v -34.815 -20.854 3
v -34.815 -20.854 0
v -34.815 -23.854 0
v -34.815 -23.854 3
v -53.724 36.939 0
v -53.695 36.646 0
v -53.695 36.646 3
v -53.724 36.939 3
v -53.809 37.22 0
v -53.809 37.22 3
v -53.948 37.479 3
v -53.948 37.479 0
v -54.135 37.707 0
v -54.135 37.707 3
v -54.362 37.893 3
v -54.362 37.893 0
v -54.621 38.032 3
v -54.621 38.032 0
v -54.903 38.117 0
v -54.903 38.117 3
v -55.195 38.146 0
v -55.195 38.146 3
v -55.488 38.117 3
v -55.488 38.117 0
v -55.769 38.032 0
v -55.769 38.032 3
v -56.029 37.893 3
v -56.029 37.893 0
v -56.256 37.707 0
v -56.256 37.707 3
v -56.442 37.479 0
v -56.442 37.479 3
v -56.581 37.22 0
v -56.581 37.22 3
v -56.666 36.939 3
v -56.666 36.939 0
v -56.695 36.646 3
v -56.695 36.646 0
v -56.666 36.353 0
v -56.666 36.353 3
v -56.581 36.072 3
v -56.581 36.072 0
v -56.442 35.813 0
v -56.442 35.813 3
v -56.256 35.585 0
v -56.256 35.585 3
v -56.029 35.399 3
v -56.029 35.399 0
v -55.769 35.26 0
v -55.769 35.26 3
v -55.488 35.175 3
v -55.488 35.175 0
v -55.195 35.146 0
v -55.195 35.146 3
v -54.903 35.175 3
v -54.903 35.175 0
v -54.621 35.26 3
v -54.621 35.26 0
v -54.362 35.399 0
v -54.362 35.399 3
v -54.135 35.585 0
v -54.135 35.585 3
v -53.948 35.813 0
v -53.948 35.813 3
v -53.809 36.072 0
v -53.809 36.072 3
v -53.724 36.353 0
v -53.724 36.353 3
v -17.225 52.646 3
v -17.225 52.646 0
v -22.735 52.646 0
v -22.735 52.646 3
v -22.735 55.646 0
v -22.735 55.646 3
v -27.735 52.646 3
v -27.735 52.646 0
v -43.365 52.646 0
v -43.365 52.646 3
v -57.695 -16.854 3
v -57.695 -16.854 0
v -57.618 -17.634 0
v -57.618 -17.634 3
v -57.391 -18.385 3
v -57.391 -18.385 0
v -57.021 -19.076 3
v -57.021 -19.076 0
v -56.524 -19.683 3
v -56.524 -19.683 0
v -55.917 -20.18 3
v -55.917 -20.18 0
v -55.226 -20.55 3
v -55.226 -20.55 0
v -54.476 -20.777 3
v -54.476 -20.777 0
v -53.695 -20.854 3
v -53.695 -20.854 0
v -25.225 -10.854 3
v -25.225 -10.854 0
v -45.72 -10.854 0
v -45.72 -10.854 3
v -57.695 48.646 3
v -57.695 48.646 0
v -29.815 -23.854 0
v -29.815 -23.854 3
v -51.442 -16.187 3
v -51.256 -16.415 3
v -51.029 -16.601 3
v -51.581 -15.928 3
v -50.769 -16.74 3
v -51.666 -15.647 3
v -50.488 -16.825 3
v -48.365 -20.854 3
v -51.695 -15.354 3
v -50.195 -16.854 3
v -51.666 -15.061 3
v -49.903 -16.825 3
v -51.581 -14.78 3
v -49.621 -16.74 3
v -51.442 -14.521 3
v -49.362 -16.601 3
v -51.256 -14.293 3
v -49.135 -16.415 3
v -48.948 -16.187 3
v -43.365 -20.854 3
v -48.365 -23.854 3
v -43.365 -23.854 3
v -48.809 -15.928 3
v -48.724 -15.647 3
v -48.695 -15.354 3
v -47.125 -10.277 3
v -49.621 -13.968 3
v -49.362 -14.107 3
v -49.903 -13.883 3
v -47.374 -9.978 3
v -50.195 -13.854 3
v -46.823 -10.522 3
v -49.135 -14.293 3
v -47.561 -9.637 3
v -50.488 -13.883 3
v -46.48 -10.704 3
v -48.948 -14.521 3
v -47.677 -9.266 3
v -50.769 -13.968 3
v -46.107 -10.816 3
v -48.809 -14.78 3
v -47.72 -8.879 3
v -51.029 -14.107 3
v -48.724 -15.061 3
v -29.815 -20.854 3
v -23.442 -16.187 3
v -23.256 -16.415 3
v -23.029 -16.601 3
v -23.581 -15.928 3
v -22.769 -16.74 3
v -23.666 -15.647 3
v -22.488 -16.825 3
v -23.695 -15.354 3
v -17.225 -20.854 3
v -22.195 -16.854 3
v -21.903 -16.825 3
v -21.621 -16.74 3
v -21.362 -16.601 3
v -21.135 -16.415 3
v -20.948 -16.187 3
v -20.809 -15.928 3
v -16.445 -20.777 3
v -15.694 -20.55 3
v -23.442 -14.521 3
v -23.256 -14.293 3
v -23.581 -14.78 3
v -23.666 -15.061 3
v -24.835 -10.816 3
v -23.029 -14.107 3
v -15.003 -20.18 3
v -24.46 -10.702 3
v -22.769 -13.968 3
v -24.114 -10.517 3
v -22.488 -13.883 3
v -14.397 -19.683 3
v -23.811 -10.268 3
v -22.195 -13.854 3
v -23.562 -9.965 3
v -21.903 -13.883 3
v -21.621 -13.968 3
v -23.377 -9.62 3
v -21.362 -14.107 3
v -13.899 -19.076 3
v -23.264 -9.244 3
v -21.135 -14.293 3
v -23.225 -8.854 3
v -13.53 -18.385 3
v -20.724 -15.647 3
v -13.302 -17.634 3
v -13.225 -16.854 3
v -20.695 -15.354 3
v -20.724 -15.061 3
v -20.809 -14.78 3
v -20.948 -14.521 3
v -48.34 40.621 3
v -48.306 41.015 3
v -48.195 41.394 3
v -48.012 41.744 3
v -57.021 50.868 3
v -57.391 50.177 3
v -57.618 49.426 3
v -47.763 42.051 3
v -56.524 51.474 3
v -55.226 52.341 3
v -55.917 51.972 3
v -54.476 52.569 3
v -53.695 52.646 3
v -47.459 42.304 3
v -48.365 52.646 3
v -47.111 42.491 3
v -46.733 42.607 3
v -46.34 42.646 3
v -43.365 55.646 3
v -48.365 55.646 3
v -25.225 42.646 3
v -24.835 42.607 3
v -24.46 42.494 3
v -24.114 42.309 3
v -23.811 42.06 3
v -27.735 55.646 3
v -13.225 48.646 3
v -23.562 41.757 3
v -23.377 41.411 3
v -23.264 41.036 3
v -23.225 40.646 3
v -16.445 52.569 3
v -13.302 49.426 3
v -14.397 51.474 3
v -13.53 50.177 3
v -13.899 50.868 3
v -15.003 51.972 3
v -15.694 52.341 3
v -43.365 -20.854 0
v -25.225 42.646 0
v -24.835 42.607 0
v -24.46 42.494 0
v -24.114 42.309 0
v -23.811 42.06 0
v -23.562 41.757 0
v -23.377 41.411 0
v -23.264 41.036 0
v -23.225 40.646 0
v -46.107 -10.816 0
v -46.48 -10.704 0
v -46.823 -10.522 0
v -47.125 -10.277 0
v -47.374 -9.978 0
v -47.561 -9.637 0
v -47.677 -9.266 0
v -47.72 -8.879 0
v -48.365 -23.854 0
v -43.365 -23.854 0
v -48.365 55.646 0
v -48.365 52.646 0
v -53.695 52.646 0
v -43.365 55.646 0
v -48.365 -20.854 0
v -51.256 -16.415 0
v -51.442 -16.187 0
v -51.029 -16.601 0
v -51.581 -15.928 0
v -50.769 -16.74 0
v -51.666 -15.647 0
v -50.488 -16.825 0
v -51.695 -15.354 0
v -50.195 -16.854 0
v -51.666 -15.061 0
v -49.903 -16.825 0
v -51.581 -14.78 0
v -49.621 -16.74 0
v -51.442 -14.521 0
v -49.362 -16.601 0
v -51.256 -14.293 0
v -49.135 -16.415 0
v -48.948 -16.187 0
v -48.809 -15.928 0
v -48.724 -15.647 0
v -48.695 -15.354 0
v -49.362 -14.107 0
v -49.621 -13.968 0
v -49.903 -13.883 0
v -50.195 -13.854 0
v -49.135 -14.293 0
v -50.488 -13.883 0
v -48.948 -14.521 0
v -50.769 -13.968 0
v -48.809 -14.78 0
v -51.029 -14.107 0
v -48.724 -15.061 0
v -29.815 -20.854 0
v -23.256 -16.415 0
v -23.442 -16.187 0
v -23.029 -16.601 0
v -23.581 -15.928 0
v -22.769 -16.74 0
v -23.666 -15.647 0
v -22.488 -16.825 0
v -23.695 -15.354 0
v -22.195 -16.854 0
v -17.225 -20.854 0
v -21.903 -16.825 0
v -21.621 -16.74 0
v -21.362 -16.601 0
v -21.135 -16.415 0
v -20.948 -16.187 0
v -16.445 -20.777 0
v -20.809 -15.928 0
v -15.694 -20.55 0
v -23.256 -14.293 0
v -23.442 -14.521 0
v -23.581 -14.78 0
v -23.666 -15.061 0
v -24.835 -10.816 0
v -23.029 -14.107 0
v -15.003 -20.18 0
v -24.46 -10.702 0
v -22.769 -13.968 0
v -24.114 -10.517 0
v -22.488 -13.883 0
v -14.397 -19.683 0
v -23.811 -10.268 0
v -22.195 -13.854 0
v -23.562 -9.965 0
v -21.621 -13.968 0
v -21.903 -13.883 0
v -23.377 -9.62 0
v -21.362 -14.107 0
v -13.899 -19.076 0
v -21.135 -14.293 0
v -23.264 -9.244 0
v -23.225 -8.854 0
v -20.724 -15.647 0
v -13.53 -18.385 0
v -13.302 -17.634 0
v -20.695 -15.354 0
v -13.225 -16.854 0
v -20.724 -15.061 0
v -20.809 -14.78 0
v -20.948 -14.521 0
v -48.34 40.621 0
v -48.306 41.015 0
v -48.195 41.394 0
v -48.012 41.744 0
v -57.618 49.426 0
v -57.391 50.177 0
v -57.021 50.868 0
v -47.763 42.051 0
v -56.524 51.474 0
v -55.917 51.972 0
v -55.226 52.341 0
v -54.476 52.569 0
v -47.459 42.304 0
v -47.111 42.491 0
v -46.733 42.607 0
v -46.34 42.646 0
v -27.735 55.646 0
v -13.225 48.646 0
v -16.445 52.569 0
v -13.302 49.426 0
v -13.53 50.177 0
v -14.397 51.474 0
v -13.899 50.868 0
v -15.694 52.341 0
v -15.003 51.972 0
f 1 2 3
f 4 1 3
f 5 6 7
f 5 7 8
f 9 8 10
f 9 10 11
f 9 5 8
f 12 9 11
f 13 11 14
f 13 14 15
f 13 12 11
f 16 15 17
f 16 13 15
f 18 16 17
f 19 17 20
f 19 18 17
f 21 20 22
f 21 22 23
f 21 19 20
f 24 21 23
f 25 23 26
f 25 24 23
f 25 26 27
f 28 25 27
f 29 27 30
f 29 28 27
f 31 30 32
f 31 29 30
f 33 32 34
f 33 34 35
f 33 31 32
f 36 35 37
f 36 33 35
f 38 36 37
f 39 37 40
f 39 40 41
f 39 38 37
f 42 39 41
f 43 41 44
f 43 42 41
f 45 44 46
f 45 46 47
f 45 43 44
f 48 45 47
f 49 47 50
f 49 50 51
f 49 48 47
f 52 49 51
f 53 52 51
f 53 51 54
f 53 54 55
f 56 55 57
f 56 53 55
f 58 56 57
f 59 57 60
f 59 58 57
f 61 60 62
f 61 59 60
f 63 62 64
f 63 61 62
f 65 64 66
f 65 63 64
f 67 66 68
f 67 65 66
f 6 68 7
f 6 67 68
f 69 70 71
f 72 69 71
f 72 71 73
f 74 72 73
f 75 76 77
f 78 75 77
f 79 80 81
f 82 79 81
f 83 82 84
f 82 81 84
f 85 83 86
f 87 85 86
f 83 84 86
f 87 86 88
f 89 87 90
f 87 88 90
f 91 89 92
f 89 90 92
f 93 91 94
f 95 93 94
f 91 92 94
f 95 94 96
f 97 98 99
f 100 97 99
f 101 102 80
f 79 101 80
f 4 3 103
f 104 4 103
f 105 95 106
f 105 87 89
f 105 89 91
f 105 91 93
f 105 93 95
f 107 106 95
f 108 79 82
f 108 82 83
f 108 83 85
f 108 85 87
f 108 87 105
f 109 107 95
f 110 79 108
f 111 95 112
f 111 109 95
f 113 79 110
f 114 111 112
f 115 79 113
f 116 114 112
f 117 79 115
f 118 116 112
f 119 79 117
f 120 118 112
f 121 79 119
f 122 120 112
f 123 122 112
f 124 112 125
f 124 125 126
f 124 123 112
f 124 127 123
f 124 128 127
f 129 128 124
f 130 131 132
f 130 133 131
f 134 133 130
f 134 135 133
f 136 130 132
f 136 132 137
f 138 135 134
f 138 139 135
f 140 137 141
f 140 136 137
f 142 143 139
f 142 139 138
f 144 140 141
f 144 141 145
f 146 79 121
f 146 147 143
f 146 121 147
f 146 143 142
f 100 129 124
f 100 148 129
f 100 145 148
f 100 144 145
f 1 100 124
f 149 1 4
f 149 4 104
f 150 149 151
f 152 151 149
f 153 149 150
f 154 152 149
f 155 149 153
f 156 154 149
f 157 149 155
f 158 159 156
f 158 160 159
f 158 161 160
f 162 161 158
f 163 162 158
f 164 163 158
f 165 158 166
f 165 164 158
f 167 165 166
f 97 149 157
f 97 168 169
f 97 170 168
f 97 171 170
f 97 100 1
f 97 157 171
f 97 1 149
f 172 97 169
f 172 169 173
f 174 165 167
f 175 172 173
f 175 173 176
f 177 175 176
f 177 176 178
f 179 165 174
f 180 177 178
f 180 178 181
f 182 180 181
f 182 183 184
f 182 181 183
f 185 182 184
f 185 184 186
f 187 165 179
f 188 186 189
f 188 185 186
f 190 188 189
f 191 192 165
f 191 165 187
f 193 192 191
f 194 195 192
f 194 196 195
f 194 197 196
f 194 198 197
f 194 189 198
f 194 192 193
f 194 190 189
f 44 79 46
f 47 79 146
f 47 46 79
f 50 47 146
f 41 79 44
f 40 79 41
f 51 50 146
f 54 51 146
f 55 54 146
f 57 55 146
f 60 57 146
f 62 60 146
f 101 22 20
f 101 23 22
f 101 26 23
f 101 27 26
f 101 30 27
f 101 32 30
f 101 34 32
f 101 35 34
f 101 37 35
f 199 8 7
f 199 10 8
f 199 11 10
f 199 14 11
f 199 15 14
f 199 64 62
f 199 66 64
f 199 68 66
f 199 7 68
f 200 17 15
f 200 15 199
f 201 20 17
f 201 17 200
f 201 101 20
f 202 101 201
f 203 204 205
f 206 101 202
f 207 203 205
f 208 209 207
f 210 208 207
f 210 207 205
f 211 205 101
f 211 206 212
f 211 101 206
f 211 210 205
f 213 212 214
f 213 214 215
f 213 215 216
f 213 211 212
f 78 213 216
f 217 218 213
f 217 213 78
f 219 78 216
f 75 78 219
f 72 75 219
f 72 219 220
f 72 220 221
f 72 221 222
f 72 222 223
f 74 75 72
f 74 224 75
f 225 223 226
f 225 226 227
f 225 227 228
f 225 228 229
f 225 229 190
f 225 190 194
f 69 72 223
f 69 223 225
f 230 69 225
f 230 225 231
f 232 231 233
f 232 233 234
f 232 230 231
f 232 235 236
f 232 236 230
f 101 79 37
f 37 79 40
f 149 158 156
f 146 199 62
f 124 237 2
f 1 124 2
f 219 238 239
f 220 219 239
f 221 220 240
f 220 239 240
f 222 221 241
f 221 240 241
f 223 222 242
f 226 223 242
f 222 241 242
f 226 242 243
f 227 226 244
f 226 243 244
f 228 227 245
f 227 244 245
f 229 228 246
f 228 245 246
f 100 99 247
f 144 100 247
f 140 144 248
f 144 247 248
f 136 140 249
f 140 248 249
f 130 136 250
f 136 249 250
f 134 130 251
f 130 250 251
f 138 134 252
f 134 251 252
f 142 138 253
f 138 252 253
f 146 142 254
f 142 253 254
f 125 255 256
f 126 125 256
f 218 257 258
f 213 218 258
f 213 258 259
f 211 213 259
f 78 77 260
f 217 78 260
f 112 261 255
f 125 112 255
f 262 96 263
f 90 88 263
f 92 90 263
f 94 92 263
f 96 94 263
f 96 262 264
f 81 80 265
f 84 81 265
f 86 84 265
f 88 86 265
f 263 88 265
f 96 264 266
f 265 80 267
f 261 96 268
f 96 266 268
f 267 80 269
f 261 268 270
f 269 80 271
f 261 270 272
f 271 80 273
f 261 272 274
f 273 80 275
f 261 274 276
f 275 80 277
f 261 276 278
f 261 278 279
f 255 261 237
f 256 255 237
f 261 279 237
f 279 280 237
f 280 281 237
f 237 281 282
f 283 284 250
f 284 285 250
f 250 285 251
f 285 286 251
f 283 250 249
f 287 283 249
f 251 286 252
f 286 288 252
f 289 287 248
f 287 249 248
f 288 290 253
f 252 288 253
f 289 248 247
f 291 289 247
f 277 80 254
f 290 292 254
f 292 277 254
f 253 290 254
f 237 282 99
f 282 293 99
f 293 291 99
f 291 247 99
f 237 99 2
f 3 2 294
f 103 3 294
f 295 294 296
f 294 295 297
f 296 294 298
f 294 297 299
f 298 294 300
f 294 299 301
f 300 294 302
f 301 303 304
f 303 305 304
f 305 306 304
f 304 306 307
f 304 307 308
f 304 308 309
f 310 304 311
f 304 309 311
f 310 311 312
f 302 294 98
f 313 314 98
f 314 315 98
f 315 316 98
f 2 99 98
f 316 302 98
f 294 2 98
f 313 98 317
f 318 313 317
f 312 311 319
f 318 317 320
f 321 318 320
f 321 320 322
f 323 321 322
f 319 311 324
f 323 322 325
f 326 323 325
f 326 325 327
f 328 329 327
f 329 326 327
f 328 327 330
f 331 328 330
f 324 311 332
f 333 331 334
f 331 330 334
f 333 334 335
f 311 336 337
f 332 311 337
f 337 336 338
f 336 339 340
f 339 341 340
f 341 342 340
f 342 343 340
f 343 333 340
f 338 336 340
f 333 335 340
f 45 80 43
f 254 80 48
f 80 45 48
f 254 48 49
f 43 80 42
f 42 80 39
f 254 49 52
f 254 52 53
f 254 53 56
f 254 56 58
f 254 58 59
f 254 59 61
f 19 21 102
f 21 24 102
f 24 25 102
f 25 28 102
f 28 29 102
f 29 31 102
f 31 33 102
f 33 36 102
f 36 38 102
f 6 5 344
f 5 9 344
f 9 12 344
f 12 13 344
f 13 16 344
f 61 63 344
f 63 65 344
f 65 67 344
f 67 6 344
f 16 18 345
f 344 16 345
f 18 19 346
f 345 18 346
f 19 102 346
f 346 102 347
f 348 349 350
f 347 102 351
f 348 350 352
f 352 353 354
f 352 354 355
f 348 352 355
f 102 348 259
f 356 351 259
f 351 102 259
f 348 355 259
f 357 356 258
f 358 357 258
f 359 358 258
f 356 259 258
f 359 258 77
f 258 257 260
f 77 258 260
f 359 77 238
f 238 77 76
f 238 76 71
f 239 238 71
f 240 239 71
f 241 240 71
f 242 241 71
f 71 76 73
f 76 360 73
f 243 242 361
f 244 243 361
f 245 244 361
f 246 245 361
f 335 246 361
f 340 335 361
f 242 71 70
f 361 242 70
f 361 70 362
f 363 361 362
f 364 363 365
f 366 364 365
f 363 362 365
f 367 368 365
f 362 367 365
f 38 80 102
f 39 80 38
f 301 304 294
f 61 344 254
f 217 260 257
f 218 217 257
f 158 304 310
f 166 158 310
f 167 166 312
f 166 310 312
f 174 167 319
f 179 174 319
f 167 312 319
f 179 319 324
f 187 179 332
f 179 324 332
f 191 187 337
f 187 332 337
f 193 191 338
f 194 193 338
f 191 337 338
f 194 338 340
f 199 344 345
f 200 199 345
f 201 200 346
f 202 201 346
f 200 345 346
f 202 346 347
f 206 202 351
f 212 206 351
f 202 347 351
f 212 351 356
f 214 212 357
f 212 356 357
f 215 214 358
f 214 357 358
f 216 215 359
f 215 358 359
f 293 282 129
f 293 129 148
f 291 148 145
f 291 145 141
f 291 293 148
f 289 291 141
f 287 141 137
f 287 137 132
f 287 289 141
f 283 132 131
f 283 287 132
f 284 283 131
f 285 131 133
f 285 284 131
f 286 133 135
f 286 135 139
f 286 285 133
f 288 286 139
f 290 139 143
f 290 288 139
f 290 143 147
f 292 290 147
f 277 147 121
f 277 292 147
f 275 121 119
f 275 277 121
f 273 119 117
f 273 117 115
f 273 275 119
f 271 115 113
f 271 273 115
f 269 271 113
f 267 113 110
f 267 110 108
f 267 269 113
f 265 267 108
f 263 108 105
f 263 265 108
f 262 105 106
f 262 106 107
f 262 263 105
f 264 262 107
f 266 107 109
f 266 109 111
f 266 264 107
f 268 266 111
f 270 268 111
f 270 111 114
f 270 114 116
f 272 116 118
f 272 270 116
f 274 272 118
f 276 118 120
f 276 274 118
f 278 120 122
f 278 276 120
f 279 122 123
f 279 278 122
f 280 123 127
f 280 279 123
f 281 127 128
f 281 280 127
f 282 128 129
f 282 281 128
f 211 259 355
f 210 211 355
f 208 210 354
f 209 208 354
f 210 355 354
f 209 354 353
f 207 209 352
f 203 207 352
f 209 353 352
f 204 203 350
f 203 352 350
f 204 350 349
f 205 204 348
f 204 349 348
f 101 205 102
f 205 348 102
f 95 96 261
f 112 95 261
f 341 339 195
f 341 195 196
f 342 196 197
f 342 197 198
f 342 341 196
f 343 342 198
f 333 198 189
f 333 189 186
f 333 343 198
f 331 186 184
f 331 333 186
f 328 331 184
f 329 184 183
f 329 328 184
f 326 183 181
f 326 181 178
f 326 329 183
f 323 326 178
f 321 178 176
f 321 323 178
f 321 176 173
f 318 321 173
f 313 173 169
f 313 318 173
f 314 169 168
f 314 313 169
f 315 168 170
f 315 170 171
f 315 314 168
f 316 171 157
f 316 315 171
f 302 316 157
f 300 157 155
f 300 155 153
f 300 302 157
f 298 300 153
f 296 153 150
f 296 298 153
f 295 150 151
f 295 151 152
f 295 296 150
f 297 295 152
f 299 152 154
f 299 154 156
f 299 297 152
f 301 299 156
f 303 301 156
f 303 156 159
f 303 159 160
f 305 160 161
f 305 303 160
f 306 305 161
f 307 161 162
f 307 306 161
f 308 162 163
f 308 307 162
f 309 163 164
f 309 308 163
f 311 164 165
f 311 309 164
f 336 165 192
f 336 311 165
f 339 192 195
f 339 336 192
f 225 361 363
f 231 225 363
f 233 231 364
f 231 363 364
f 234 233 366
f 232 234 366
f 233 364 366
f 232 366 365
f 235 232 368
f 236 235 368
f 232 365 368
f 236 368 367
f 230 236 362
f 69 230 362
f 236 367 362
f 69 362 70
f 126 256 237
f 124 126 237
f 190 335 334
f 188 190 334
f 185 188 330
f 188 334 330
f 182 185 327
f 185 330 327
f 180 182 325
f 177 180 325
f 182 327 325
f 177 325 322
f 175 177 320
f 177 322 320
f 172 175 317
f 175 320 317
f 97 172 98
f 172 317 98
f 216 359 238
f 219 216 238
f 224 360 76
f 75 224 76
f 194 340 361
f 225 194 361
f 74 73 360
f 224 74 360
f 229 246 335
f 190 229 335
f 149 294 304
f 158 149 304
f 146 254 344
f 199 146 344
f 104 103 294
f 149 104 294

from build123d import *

# Parameters (mm, degrees)
CROQUIS1_R              = 1.5
SALIENTE_EXTRUIR1_DEPTH = 3


with BuildPart() as part:
    # Croquis1 → Saliente-Extruir1 (new body)
    with BuildSketch(Plane.XY):
        with BuildLine():
            Line((-27.735211809, 52.645866632), (-43.365211809, 52.645866632))
            Line((-43.365211809, 52.645866632), (-43.365211809, 55.645866632))
            Line((-43.365211809, 55.645866632), (-48.365211809, 55.645866632))
            Line((-48.365211809, 55.645866632), (-48.365211809, 52.645866632))
            Line((-48.365211809, 52.645866632), (-53.695211809, 52.645866632))
            ThreePointArc((-53.695211809, 52.645866632), (-56.523638933, 51.474293757), (-57.695211809, 48.645866632))
            Line((-57.695211809, 48.645866632), (-57.695211809, -16.854133368))
            ThreePointArc((-57.695211809, -16.854133368), (-56.523638933, -19.682560493), (-53.695211809, -20.854133368))
            Line((-53.695211809, -20.854133368), (-48.365211809, -20.854133368))
            Line((-48.365211809, -20.854133368), (-48.365211809, -23.854133368))
            Line((-48.365211809, -23.854133368), (-43.365211809, -23.854133368))
            Line((-43.365211809, -23.854133368), (-43.365211809, -20.854133368))
            Line((-43.365211809, -20.854133368), (-34.815211809, -20.854133368))
            Line((-34.815211809, -20.854133368), (-34.815211809, -23.854133368))
            Line((-34.815211809, -23.854133368), (-29.815211809, -23.854133368))
            Line((-29.815211809, -23.854133368), (-29.815211809, -20.854133368))
            Line((-29.815211809, -20.854133368), (-17.225211809, -20.854133368))
            ThreePointArc((-17.225211809, -20.854133368), (-14.396784684, -19.682560493), (-13.225211809, -16.854133368))
            Line((-13.225211809, -16.854133368), (-13.225211809, 48.645866632))
            ThreePointArc((-13.225211809, 48.645866632), (-14.396784684, 51.474293757), (-17.225211809, 52.645866632))
            Line((-17.225211809, 52.645866632), (-22.735211809, 52.645866632))
            Line((-22.735211809, 52.645866632), (-22.735211809, 55.645866632))
            Line((-22.735211809, 55.645866632), (-27.735211809, 55.645866632))
            Line((-27.735211809, 55.645866632), (-27.735211809, 52.645866632))
        make_face()
        with Locations((-55.195211809, 36.645866632)):
            Circle(CROQUIS1_R, mode=Mode.SUBTRACT)
        with Locations((-50.195211809, -15.354133368)):
            Circle(CROQUIS1_R, mode=Mode.SUBTRACT)
        with Locations((-22.195211809, -15.354133368)):
            Circle(CROQUIS1_R, mode=Mode.SUBTRACT)
        with BuildLine():
            Line((-35.550211809, 42.645866632), (-25.225211809, 42.645866632))
            ThreePointArc((-25.225211809, 42.645866632), (-23.810998246, 42.060080194), (-23.225211809, 40.645866632))
            Line((-23.225211809, 40.645866632), (-23.225211809, -8.854133368))
            ThreePointArc((-23.225211809, -8.854133368), (-23.810998246, -10.26834693), (-25.225211809, -10.854133368))
            Line((-25.225211809, -10.854133368), (-45.720101709, -10.854133368))
            ThreePointArc((-45.720101709, -10.854133368), (-47.125432715, -10.277174044), (-47.719944893, -8.879178133))
            Line((-47.719944893, -8.879178133), (-48.339851435, 40.620821867))
            ThreePointArc((-48.339851435, 40.620821867), (-47.763048927, 42.051197638), (-46.340008251, 42.645866632))
            Line((-46.340008251, 42.645866632), (-35.550211809, 42.645866632))
        make_face(mode=Mode.SUBTRACT)
    extrude(amount=SALIENTE_EXTRUIR1_DEPTH)


solid = part.part
